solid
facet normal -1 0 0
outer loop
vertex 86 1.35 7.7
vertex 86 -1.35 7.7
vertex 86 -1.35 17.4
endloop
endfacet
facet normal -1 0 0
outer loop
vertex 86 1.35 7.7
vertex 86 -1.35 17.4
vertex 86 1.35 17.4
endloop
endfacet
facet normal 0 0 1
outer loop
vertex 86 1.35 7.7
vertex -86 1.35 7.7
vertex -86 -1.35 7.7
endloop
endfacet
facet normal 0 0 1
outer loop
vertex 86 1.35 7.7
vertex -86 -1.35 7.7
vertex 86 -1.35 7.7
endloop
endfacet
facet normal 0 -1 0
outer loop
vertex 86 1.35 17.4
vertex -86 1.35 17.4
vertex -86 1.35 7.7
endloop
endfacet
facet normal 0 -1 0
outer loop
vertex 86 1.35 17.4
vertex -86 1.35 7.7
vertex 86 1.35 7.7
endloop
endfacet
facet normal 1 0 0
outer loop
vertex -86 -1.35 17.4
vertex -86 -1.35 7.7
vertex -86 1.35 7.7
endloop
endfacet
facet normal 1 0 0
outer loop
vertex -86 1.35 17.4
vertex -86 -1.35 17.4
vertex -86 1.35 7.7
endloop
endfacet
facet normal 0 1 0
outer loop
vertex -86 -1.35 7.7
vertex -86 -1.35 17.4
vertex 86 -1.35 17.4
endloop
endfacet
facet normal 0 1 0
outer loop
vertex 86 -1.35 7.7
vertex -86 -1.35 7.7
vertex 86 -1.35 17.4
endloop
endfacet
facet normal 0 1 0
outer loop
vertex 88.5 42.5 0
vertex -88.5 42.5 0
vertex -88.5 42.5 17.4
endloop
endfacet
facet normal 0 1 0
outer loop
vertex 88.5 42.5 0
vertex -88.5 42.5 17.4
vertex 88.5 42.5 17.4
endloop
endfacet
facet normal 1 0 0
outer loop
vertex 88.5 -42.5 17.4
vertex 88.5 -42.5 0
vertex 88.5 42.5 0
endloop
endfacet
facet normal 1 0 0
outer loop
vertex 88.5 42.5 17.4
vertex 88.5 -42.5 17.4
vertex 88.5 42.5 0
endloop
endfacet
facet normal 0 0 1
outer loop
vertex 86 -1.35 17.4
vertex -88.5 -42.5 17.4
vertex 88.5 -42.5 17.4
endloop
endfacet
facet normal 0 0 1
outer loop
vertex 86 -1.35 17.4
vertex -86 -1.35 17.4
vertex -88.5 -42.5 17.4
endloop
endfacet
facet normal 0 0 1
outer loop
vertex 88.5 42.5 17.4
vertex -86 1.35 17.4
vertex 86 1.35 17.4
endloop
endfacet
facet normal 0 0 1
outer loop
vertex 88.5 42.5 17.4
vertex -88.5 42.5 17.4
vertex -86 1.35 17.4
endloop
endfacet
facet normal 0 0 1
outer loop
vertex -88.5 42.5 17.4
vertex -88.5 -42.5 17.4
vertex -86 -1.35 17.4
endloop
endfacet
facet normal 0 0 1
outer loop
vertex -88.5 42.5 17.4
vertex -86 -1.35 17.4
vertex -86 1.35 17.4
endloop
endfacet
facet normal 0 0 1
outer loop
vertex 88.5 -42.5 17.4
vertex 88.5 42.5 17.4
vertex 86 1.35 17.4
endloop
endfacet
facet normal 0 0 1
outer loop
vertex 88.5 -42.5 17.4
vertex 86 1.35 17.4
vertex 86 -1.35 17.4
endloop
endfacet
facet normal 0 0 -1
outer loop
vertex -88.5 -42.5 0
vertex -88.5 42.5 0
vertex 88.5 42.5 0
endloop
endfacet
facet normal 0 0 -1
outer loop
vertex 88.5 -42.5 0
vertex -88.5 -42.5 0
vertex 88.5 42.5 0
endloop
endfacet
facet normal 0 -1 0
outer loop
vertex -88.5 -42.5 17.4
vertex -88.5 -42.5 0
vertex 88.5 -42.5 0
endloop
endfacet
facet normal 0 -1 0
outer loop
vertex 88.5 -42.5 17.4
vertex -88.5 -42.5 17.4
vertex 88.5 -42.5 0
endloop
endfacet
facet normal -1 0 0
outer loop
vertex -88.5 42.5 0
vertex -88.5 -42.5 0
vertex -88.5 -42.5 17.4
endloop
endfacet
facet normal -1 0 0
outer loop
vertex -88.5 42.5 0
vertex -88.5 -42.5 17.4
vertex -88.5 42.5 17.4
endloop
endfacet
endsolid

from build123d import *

# Parameters (mm, degrees)
F0_W     = 177
F0_H     = 85
F1_DEPTH = 17.4
F2_W     = 172
F2_H     = 2.7
F3_DEPTH = 9.7


with BuildPart() as f1:
    # F0 (on Top) → F1 (new body)
    with BuildSketch(Plane.XY):
        Rectangle(F0_W, F0_H)
    extrude(amount=F1_DEPTH)

    # F2 (on face) → F3 (cut)
    with BuildSketch(Plane.XY.offset(17.4)):
        Rectangle(F2_W, F2_H)
    extrude(amount=-F3_DEPTH, mode=Mode.SUBTRACT)


solid = f1.part
